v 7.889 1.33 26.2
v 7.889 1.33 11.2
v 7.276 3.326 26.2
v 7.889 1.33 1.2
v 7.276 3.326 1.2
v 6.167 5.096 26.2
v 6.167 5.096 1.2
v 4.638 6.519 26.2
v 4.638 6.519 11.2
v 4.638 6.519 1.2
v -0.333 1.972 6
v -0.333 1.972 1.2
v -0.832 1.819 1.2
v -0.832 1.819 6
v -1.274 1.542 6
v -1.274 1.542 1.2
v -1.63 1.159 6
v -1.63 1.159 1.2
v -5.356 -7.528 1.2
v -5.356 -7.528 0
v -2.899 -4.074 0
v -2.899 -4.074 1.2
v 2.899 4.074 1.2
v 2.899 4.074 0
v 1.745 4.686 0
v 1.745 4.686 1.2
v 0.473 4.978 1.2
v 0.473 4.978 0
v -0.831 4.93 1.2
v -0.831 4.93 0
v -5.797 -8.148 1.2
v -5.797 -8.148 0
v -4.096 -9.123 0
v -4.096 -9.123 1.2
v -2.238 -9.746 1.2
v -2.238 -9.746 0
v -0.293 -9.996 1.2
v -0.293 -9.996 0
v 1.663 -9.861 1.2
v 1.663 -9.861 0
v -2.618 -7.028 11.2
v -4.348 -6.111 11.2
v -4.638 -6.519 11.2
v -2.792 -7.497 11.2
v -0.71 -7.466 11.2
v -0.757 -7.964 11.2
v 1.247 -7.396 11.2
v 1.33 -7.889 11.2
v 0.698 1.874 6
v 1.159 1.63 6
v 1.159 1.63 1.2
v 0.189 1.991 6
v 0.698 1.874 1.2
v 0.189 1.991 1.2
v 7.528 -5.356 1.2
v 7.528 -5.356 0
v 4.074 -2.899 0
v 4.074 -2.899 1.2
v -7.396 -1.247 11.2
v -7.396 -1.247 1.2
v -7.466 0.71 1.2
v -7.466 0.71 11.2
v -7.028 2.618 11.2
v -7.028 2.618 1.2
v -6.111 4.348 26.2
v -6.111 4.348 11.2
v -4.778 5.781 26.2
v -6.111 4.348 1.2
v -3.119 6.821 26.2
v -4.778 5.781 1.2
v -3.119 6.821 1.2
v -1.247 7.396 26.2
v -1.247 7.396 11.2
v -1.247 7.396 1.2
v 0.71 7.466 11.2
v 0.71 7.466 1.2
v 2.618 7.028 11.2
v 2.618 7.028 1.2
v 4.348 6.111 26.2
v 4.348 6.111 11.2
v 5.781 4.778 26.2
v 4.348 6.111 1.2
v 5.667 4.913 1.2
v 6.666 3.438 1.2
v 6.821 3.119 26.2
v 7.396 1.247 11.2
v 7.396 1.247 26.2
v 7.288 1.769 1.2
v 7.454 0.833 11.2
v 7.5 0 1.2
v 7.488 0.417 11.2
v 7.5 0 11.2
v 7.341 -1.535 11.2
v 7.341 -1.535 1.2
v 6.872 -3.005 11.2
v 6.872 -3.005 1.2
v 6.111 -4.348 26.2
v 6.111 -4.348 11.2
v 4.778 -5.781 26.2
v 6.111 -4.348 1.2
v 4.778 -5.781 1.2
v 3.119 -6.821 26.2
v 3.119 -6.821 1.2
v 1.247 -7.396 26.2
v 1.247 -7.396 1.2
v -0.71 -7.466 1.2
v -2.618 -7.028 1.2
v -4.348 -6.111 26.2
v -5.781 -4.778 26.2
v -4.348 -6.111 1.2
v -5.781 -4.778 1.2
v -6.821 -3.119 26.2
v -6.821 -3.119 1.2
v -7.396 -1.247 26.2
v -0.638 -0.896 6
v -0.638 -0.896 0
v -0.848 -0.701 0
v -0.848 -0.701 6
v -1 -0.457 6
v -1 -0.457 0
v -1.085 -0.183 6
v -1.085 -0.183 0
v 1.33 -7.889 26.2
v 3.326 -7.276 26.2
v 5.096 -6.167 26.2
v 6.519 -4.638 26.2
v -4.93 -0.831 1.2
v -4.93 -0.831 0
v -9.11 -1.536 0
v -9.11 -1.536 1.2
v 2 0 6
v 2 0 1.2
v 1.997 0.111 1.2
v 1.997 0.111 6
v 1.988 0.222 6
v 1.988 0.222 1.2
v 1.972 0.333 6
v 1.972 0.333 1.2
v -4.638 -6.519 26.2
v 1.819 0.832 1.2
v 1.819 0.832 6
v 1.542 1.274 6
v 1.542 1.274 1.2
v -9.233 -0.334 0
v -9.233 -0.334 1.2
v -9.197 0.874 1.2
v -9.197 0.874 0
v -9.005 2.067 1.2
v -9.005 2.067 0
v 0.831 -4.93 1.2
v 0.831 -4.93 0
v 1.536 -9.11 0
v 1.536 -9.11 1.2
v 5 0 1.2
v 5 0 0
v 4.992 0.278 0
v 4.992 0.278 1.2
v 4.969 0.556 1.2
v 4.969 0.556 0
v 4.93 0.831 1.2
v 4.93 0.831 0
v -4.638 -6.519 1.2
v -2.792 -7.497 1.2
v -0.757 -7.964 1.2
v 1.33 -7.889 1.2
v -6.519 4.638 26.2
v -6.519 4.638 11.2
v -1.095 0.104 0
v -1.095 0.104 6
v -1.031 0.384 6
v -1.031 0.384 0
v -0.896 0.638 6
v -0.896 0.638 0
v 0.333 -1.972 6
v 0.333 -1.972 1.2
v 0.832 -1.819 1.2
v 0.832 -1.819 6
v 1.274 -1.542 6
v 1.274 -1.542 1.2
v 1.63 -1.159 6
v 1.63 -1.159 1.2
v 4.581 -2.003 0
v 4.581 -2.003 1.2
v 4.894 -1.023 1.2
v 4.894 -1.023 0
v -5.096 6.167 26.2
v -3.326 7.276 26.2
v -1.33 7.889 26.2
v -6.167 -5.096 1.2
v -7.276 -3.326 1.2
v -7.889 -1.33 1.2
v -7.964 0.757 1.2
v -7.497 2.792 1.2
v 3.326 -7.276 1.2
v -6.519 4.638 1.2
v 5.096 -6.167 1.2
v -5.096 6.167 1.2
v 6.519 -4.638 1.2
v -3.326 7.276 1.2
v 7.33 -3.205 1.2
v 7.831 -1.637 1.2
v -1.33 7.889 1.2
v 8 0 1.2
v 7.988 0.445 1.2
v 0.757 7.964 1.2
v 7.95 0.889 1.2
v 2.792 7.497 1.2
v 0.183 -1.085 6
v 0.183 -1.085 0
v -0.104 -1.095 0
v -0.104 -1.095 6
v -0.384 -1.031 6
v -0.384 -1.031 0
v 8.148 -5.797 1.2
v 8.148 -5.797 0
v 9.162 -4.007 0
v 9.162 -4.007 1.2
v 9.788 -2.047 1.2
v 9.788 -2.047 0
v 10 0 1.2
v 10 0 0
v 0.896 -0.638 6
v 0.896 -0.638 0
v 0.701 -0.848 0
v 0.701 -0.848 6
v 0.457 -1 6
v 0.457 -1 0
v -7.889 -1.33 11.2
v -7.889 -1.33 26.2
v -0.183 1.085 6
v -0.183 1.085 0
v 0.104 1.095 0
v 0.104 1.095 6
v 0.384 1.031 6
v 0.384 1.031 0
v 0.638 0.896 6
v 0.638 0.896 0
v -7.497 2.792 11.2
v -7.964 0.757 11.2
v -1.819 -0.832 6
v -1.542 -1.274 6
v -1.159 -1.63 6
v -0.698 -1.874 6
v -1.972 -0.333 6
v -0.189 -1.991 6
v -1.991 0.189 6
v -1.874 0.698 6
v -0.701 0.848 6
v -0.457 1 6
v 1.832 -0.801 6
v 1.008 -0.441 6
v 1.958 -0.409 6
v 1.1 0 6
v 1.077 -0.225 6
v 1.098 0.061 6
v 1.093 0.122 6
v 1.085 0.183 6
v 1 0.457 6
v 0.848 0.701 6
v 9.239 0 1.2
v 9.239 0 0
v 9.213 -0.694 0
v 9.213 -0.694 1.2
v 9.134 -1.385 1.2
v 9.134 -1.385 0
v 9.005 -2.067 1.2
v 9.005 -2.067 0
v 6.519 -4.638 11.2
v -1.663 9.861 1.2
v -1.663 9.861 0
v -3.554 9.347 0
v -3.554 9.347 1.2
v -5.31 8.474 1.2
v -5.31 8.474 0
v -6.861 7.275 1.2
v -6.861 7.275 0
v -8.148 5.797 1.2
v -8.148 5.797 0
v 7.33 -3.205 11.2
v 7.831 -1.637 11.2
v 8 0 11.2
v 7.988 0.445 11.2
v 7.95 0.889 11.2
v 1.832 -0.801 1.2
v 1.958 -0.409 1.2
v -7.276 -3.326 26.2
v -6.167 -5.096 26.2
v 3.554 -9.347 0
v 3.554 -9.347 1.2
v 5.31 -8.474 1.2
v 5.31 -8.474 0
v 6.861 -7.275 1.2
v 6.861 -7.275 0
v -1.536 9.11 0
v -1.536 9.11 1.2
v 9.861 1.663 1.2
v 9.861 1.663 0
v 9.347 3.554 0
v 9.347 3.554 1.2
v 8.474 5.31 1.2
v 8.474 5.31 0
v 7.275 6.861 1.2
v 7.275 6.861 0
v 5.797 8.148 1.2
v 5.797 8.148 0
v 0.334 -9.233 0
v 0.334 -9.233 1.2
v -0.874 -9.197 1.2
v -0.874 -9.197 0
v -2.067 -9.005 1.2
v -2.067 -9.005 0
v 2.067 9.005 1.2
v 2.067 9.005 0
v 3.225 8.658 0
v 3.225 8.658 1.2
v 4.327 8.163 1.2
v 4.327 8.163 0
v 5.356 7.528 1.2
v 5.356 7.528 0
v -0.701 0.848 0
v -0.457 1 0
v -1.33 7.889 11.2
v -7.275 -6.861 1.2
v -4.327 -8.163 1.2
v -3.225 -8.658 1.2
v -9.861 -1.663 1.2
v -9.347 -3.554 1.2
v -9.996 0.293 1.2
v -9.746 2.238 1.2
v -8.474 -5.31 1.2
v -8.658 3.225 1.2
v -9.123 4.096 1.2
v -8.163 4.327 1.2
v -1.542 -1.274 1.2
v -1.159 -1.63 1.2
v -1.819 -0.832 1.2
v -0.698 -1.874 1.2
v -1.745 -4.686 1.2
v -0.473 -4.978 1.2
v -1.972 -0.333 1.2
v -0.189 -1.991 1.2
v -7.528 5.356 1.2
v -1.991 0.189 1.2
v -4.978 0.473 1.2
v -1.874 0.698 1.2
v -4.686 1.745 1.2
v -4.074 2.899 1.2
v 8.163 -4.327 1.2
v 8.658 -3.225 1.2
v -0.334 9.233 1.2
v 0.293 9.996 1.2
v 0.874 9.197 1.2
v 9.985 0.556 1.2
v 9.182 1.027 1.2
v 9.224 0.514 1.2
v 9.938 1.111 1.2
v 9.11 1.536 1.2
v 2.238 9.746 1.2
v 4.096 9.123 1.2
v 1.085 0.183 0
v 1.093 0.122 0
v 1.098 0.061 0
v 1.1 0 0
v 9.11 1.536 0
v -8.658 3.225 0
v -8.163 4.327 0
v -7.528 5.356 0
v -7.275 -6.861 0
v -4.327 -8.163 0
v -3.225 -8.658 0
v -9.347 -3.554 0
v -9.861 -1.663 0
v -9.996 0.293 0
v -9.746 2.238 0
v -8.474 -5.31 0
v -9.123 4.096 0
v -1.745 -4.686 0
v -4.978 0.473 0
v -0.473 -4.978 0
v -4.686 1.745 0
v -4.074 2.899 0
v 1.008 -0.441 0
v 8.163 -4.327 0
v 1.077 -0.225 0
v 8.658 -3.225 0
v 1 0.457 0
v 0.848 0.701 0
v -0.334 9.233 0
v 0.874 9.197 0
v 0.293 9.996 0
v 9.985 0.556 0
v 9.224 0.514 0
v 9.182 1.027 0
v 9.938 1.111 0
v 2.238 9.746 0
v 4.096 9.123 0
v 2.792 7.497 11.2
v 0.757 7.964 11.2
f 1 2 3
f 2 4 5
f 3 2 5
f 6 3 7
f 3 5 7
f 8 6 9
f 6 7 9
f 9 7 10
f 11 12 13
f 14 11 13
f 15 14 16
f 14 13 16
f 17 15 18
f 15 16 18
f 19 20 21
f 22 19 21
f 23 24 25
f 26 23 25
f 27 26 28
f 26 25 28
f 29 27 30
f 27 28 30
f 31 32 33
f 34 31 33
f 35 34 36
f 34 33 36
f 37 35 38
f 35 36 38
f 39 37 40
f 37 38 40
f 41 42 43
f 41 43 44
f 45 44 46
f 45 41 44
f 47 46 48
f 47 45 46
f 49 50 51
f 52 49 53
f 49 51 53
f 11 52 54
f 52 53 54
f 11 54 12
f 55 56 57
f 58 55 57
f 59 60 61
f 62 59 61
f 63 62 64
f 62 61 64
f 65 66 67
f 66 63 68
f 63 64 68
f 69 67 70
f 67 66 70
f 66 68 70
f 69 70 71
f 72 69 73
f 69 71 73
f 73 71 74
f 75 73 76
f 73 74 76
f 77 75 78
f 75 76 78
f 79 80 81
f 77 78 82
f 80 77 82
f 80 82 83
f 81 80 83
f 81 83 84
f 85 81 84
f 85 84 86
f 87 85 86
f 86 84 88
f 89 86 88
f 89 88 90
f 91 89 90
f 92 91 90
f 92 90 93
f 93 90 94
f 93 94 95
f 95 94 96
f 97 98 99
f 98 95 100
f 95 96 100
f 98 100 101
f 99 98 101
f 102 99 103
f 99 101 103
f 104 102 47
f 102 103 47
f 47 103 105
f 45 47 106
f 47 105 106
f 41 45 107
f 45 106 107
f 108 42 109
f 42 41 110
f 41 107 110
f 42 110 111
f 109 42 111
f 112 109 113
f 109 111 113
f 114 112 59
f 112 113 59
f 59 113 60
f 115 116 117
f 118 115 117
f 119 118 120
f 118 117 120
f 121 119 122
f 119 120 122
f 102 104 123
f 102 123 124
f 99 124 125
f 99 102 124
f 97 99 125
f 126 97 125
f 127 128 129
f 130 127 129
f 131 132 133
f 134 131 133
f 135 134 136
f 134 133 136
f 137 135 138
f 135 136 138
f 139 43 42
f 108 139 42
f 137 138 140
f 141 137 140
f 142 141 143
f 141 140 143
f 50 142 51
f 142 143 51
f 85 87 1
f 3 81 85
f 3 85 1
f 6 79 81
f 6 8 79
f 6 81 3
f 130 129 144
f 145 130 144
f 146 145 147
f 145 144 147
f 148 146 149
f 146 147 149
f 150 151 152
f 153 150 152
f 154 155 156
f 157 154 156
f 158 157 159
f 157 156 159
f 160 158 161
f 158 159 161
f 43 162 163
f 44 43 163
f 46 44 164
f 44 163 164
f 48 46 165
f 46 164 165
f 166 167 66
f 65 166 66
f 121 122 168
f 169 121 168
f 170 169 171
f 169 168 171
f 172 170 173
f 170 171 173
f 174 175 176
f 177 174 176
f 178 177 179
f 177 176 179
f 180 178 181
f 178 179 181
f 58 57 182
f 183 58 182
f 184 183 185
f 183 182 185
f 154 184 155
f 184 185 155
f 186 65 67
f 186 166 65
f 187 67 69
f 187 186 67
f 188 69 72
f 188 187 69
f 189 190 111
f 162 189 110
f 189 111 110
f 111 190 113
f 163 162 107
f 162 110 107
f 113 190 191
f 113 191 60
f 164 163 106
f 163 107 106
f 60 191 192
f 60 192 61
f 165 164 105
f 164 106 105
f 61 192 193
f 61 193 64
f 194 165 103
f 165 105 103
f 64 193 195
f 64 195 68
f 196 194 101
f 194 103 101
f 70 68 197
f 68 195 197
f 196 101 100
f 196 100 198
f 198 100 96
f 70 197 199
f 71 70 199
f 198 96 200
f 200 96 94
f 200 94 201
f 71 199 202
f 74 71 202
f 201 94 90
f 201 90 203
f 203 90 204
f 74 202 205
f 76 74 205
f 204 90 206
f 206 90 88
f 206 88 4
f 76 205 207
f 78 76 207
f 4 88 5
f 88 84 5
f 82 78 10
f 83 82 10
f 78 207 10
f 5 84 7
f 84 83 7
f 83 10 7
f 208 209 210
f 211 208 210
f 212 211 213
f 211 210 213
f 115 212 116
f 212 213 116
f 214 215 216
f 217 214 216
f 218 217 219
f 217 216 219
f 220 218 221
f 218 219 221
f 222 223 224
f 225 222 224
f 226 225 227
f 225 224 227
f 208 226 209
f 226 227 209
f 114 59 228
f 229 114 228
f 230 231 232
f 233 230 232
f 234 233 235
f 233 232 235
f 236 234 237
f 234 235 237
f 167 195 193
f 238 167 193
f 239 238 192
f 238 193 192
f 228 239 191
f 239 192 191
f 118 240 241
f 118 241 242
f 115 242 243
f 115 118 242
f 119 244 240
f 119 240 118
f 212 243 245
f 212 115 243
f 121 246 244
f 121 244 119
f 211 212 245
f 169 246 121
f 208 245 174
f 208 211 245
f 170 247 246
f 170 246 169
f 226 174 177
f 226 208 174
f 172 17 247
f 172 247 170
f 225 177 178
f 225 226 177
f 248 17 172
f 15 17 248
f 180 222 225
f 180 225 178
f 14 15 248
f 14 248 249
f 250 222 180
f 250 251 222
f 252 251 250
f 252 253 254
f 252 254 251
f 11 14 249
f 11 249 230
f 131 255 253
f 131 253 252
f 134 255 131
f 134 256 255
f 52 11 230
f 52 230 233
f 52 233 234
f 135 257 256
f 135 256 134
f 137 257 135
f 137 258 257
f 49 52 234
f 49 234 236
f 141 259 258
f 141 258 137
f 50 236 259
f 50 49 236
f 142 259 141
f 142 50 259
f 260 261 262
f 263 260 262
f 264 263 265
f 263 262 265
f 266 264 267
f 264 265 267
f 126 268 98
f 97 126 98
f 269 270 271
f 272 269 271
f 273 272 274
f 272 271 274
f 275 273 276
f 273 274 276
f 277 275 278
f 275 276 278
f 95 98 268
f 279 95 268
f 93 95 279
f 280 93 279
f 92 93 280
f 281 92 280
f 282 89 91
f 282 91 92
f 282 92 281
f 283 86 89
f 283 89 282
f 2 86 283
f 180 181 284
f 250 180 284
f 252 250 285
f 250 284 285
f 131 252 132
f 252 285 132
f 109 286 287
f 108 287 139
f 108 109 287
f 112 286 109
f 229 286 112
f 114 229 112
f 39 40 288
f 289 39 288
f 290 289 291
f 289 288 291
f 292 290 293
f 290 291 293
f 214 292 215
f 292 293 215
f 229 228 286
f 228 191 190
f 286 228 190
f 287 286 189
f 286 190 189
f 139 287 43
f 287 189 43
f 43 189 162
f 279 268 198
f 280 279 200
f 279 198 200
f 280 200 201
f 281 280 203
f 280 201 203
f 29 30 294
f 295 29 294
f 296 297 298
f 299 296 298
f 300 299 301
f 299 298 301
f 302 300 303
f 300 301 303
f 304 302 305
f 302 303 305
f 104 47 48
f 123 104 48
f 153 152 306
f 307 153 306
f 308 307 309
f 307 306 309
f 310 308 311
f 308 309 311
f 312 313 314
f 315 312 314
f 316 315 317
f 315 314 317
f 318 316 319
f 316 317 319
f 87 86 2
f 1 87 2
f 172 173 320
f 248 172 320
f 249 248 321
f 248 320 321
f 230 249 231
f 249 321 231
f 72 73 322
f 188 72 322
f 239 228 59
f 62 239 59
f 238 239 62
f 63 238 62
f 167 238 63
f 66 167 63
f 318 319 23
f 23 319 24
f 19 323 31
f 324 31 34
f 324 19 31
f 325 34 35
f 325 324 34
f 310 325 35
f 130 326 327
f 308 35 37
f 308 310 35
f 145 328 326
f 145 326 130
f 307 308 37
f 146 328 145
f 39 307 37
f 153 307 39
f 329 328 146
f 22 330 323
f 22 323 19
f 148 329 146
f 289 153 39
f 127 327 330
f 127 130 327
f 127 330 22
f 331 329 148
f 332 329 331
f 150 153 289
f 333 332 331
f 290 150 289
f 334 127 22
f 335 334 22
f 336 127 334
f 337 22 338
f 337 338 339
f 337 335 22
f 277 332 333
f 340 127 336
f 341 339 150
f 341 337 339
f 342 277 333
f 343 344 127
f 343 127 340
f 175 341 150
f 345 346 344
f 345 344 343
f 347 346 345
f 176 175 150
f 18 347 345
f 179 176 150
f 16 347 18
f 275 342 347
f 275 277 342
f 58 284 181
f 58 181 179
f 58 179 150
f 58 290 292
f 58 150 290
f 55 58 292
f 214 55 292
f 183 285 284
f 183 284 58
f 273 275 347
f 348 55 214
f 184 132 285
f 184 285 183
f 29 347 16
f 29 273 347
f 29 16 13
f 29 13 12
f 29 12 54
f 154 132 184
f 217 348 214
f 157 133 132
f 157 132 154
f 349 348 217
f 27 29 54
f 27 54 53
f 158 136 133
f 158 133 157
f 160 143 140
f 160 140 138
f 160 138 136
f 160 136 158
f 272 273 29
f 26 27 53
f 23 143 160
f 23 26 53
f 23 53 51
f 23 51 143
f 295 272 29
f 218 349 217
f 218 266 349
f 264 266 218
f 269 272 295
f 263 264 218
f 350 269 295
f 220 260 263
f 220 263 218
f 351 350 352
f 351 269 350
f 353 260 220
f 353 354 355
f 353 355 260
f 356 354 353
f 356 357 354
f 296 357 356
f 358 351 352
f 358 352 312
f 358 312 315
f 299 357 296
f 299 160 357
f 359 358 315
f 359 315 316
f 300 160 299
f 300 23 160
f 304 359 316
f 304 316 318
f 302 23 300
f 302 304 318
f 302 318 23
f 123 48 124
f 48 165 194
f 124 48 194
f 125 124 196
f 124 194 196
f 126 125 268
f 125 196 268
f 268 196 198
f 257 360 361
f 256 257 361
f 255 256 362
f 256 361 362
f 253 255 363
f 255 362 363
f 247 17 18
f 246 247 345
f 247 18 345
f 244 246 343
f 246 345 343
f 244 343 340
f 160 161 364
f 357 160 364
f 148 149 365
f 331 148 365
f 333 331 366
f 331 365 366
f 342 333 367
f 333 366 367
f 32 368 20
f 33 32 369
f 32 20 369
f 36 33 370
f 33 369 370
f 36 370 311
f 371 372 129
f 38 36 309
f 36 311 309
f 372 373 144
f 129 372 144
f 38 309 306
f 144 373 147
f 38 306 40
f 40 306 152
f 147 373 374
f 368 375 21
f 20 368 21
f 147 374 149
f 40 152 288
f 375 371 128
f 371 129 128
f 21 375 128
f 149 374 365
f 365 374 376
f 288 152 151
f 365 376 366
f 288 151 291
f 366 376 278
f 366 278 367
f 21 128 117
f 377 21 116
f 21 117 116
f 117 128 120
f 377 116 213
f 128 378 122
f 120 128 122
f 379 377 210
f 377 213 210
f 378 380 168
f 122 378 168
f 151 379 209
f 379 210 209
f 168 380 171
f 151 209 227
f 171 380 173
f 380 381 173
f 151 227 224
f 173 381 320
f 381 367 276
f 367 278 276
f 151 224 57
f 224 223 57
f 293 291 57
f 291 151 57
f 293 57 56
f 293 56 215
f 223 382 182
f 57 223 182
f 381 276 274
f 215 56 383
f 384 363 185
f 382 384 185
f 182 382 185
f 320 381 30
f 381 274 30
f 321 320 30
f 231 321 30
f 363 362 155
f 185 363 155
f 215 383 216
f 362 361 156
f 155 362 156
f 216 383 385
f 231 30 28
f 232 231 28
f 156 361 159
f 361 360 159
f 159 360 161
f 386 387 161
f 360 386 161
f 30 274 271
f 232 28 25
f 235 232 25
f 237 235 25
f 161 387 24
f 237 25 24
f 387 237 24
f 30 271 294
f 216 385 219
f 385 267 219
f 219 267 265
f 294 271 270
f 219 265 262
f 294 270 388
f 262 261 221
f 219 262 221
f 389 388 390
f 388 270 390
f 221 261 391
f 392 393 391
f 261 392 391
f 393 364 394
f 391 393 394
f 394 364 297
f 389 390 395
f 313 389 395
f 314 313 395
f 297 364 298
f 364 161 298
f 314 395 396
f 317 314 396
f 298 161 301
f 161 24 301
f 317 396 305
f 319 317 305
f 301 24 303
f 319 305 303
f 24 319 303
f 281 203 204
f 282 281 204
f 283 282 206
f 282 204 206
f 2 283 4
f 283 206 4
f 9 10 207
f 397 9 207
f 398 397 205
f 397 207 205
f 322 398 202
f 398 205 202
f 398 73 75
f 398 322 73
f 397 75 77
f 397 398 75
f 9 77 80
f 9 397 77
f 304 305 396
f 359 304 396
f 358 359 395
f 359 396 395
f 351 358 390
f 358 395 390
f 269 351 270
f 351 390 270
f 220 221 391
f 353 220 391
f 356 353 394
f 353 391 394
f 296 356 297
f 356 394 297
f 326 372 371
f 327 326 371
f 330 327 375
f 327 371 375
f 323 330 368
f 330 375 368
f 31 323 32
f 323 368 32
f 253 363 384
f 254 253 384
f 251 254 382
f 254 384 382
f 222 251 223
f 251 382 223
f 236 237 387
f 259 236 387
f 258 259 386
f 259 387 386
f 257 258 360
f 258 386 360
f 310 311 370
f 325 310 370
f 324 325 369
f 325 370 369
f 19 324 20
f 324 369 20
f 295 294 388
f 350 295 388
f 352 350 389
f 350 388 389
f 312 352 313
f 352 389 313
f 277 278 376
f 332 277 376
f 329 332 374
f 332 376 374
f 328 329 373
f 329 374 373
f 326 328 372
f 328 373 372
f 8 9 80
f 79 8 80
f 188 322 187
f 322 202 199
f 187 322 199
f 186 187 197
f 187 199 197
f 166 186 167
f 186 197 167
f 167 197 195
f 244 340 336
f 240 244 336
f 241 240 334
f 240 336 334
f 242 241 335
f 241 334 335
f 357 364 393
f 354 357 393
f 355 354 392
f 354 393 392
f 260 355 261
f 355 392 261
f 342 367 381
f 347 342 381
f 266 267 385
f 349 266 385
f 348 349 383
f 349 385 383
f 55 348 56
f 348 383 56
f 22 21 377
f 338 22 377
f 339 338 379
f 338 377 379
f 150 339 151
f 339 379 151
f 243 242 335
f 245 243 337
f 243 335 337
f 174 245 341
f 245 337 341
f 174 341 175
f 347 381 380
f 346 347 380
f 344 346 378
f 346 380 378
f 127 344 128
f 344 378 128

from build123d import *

# Parameters (mm, degrees)
F1_DEPTH = 1.2
F2_DEPTH = 6
F4_DEPTH = 25
F5_DEPTH = 10


with BuildPart() as f1:
    # F0 (on Top) → F1 (new body)
    with BuildSketch(Plane.XY):
        with BuildLine():
            ThreePointArc((8.1482783535, -5.7970302633), (9.5258276159, -3.0427961207), (10, 0))
            ThreePointArc((10, 0), (9.965144828, 0.8341993506), (9.8608222887, 1.6625834689))
            Line((9.8608222887, 1.6625834689), (9.0045502887, -2.0672235383))
            Line((9.0045502887, -2.0672235383), (8.1482783535, -5.7970302633))
        make_face()
        with BuildLine():
            Line((7.8289263433, 4.9054308037), (9.8608222887, 1.6625834689))
            ThreePointArc((9.8608222887, 1.6625834689), (8.4739687378, 5.3096001573), (5.7970302633, 8.1482783535))
            Line((5.7970302633, 8.1482783535), (7.8289263433, 4.9054308037))
        make_face()
        with BuildLine():
            Line((9.1102118863, 1.536026838), (9.8608222887, 1.6625834689))
            Line((9.8608222887, 1.6625834689), (7.8289263433, 4.9054308037))
            ThreePointArc((7.8289263433, 4.9054308037), (8.6354977715, 3.2838266242), (9.1102118863, 1.536026838))
        make_face()
        with BuildLine():
            Line((9.0045502887, -2.0672235383), (9.8608222887, 1.6625834689))
            Line((9.8608222887, 1.6625834689), (9.1102118863, 1.536026838))
            ThreePointArc((9.1102118863, 1.536026838), (9.2065933451, 0.7706997061), (9.2387953251, 0))
            ThreePointArc((9.2387953251, 0), (9.1800472812, -1.040226405), (9.0045502887, -2.0672235383))
        make_face()
        with BuildLine():
            Line((7.528027596, -5.3557576096), (8.1482783535, -5.7970302633))
            Line((8.1482783535, -5.7970302633), (9.0045502887, -2.0672235383))
            ThreePointArc((9.0045502887, -2.0672235383), (8.4282351037, -3.7842029671), (7.528027596, -5.3557576096))
        make_face()
        with BuildLine():
            ThreePointArc((1.6625834689, -9.8608222887), (5.3096001573, -8.4739687378), (8.1482783535, -5.7970302633))
            Line((8.1482783535, -5.7970302633), (4.9054307168, -7.8289263978))
            Line((4.9054307168, -7.8289263978), (1.6625834689, -9.8608222887))
        make_face()
        with BuildLine():
            Line((4.9054307168, -7.8289263978), (8.1482783535, -5.7970302633))
            Line((8.1482783535, -5.7970302633), (7.528027596, -5.3557576096))
            ThreePointArc((7.528027596, -5.3557576096), (6.3385220965, -6.7214936355), (4.9054307168, -7.8289263978))
        make_face()
        with BuildLine():
            Line((2.0672236693, 9.0045502586), (5.7970302633, 8.1482783535))
            ThreePointArc((5.7970302633, 8.1482783535), (2.2375464814, 9.7464550347), (-1.6625834689, 9.8608222887))
            Line((-1.6625834689, 9.8608222887), (2.0672236693, 9.0045502586))
        make_face()
        with BuildLine():
            Line((5.3557576096, 7.528027596), (5.7970302633, 8.1482783535))
            Line((5.7970302633, 8.1482783535), (2.0672236693, 9.0045502586))
            ThreePointArc((2.0672236693, 9.0045502586), (3.7842030284, 8.4282350762), (5.3557576096, 7.528027596))
        make_face()
        with BuildLine():
            Line((7.8289263433, 4.9054308037), (5.7970302633, 8.1482783535))
            Line((5.7970302633, 8.1482783535), (5.3557576096, 7.528027596))
            ThreePointArc((5.3557576096, 7.528027596), (6.7214936003, 6.3385221338), (7.8289263433, 4.9054308037))
        make_face()
        with BuildLine():
            Line((1.536026838, -9.1102118863), (1.6625834689, -9.8608222887))
            Line((1.6625834689, -9.8608222887), (4.9054307168, -7.8289263978))
            ThreePointArc((4.9054307168, -7.8289263978), (3.2838265763, -8.6354977897), (1.536026838, -9.1102118863))
        make_face()
        with BuildLine():
            ThreePointArc((-5.7970302633, -8.1482783535), (-2.2375464814, -9.7464550347), (1.6625834689, -9.8608222887))
            Line((1.6625834689, -9.8608222887), (-2.0672231954, -9.0045503674))
            Line((-2.0672231954, -9.0045503674), (-5.7970302633, -8.1482783535))
        make_face()
        with BuildLine():
            Line((-2.0672231954, -9.0045503674), (1.6625834689, -9.8608222887))
            Line((1.6625834689, -9.8608222887), (1.536026838, -9.1102118863))
            ThreePointArc((1.536026838, -9.1102118863), (-0.2708015541, -9.2348256929), (-2.0672231954, -9.0045503674))
        make_face()
        with BuildLine():
            Line((-4.9054310148, 7.828926211), (-1.6625834689, 9.8608222887))
            ThreePointArc((-1.6625834689, 9.8608222887), (-5.3096001573, 8.4739687378), (-8.1482783535, 5.7970302633))
            Line((-8.1482783535, 5.7970302633), (-4.9054310148, 7.828926211))
        make_face()
        with BuildLine():
            Line((-1.536026838, 9.1102118863), (-1.6625834689, 9.8608222887))
            Line((-1.6625834689, 9.8608222887), (-4.9054310148, 7.828926211))
            ThreePointArc((-4.9054310148, 7.828926211), (-3.2838267407, 8.6354977272), (-1.536026838, 9.1102118863))
        make_face()
        with BuildLine():
            Line((2.0672236693, 9.0045502586), (-1.6625834689, 9.8608222887))
            Line((-1.6625834689, 9.8608222887), (-1.536026838, 9.1102118863))
            ThreePointArc((-1.536026838, 9.1102118863), (0.2708017971, 9.2348256857), (2.0672236693, 9.0045502586))
        make_face()
        with BuildLine():
            Line((-5.3557576096, -7.528027596), (-5.7970302633, -8.1482783535))
            Line((-5.7970302633, -8.1482783535), (-2.0672231954, -9.0045503674))
            ThreePointArc((-2.0672231954, -9.0045503674), (-3.7842028066, -8.4282351757), (-5.3557576096, -7.528027596))
        make_face()
        with BuildLine():
            ThreePointArc((-9.8608222887, -1.6625834689), (-8.4739687378, -5.3096001573), (-5.7970302633, -8.1482783535))
            Line((-5.7970302633, -8.1482783535), (-7.8289263978, -4.9054307168))
            Line((-7.8289263978, -4.9054307168), (-9.8608222887, -1.6625834689))
        make_face()
        with BuildLine():
            Line((-7.8289263978, -4.9054307168), (-5.7970302633, -8.1482783535))
            Line((-5.7970302633, -8.1482783535), (-5.3557576096, -7.528027596))
            ThreePointArc((-5.3557576096, -7.528027596), (-6.7214936355, -6.3385220965), (-7.8289263978, -4.9054307168))
        make_face()
        with BuildLine():
            Line((-9.004550337, 2.0672233281), (-8.1482783535, 5.7970302633))
            ThreePointArc((-8.1482783535, 5.7970302633), (-9.7464550347, 2.2375464814), (-9.8608222887, -1.6625834689))
            Line((-9.8608222887, -1.6625834689), (-9.004550337, 2.0672233281))
        make_face()
        with BuildLine():
            Line((-7.528027596, 5.3557576096), (-8.1482783535, 5.7970302633))
            Line((-8.1482783535, 5.7970302633), (-9.004550337, 2.0672233281))
            ThreePointArc((-9.004550337, 2.0672233281), (-8.4282351479, 3.7842028687), (-7.528027596, 5.3557576096))
        make_face()
        with BuildLine():
            Line((-4.9054310148, 7.828926211), (-8.1482783535, 5.7970302633))
            Line((-8.1482783535, 5.7970302633), (-7.528027596, 5.3557576096))
            ThreePointArc((-7.528027596, 5.3557576096), (-6.3385222244, 6.7214935148), (-4.9054310148, 7.828926211))
        make_face()
        with BuildLine():
            Line((-9.1102118863, -1.536026838), (-9.8608222887, -1.6625834689))
            Line((-9.8608222887, -1.6625834689), (-7.8289263978, -4.9054307168))
            ThreePointArc((-7.8289263978, -4.9054307168), (-8.6354977897, -3.2838265763), (-9.1102118863, -1.536026838))
        make_face()
        with BuildLine():
            Line((-9.004550337, 2.0672233281), (-9.8608222887, -1.6625834689))
            Line((-9.8608222887, -1.6625834689), (-9.1102118863, -1.536026838))
            ThreePointArc((-9.1102118863, -1.536026838), (-9.2348256909, 0.2708016221), (-9.004550337, 2.0672233281))
        make_face()
        with BuildLine():
            ThreePointArc((-4.9304111443, -0.8312917344), (-4.2369843689, -2.6548000787), (-2.8985151316, -4.0741391768))
            Line((-2.8985151316, -4.0741391768), (-1.1594060527, -1.6296556707))
            ThreePointArc((-1.1594060527, -1.6296556707), (-1.6947937476, -1.0619200315), (-1.9721644577, -0.3325166938))
            Line((-1.9721644577, -0.3325166938), (-4.9304111443, -0.8312917344))
        make_face()
        with BuildLine():
            Line((-1.6296556707, 1.1594060527), (-4.0741391768, 2.8985151316))
            ThreePointArc((-4.0741391768, 2.8985151316), (-4.8732275174, 1.1187732407), (-4.9304111443, -0.8312917344))
            Line((-4.9304111443, -0.8312917344), (-1.9721644577, -0.3325166938))
            ThreePointArc((-1.9721644577, -0.3325166938), (-1.9492910069, 0.4475092963), (-1.6296556707, 1.1594060527))
        make_face()
        with BuildLine():
            Line((-0.3325166938, 1.9721644577), (-0.8312917344, 4.9304111443))
            ThreePointArc((-0.8312917344, 4.9304111443), (-2.6548000787, 4.2369843689), (-4.0741391768, 2.8985151316))
            Line((-4.0741391768, 2.8985151316), (-1.6296556707, 1.1594060527))
            ThreePointArc((-1.6296556707, 1.1594060527), (-1.0619200315, 1.6947937476), (-0.3325166938, 1.9721644577))
        make_face()
        with BuildLine():
            Line((1.1594060527, 1.6296556707), (2.8985151316, 4.0741391768))
            ThreePointArc((2.8985151316, 4.0741391768), (1.1187732407, 4.8732275174), (-0.8312917344, 4.9304111443))
            Line((-0.8312917344, 4.9304111443), (-0.3325166938, 1.9721644577))
            ThreePointArc((-0.3325166938, 1.9721644577), (0.4475092963, 1.9492910069), (1.1594060527, 1.6296556707))
        make_face()
        with BuildLine():
            Line((1.9721644577, 0.3325166938), (4.9304111443, 0.8312917344))
            ThreePointArc((4.9304111443, 0.8312917344), (4.2369843689, 2.6548000787), (2.8985151316, 4.0741391768))
            Line((2.8985151316, 4.0741391768), (1.1594060527, 1.6296556707))
            ThreePointArc((1.1594060527, 1.6296556707), (1.6947937476, 1.0619200315), (1.9721644577, 0.3325166938))
        make_face()
        with BuildLine():
            ThreePointArc((5, 0), (4.982572414, 0.4170996753), (4.9304111443, 0.8312917344))
            Line((4.9304111443, 0.8312917344), (1.9721644577, 0.3325166938))
            ThreePointArc((1.9721644577, 0.3325166938), (1.9930289656, 0.1668398701), (2, 0))
            ThreePointArc((2, 0), (1.9051655232, -0.6085592241), (1.6296556707, -1.1594060527))
            Line((1.6296556707, -1.1594060527), (4.0741391768, -2.8985151316))
            ThreePointArc((4.0741391768, -2.8985151316), (4.7629138079, -1.5213980604), (5, 0))
        make_face()
        with BuildLine():
            ThreePointArc((0.8312917344, -4.9304111443), (2.6548000787, -4.2369843689), (4.0741391768, -2.8985151316))
            Line((4.0741391768, -2.8985151316), (1.6296556707, -1.1594060527))
            ThreePointArc((1.6296556707, -1.1594060527), (1.0619200315, -1.6947937476), (0.3325166938, -1.9721644577))
            Line((0.3325166938, -1.9721644577), (0.8312917344, -4.9304111443))
        make_face()
        with BuildLine():
            ThreePointArc((-2.8985151316, -4.0741391768), (-1.1187732407, -4.8732275174), (0.8312917344, -4.9304111443))
            Line((0.8312917344, -4.9304111443), (0.3325166938, -1.9721644577))
            ThreePointArc((0.3325166938, -1.9721644577), (-0.4475092963, -1.9492910069), (-1.1594060527, -1.6296556707))
            Line((-1.1594060527, -1.6296556707), (-2.8985151316, -4.0741391768))
        make_face()
        with BuildLine():
            ThreePointArc((1.536026838, -9.1102118863), (3.2838265763, -8.6354977897), (4.9054307168, -7.8289263978))
            ThreePointArc((4.9054307168, -7.8289263978), (6.3385220965, -6.7214936355), (7.528027596, -5.3557576096))
            Line((7.528027596, -5.3557576096), (4.0741391768, -2.8985151316))
            ThreePointArc((4.0741391768, -2.8985151316), (2.6548000787, -4.2369843689), (0.8312917344, -4.9304111443))
            Line((0.8312917344, -4.9304111443), (1.536026838, -9.1102118863))
        make_face()
        with BuildLine():
            ThreePointArc((9.1102118863, 1.536026838), (8.6354977715, 3.2838266242), (7.8289263433, 4.9054308037))
            ThreePointArc((7.8289263433, 4.9054308037), (6.7214936003, 6.3385221338), (5.3557576096, 7.528027596))
            Line((5.3557576096, 7.528027596), (2.8985151316, 4.0741391768))
            ThreePointArc((2.8985151316, 4.0741391768), (4.2369843689, 2.6548000787), (4.9304111443, 0.8312917344))
            Line((4.9304111443, 0.8312917344), (9.1102118863, 1.536026838))
        make_face()
        with BuildLine():
            ThreePointArc((-1.536026838, 9.1102118863), (-3.2838267407, 8.6354977272), (-4.9054310148, 7.828926211))
            ThreePointArc((-4.9054310148, 7.828926211), (-6.3385222244, 6.7214935148), (-7.528027596, 5.3557576096))
            Line((-7.528027596, 5.3557576096), (-4.0741391768, 2.8985151316))
            ThreePointArc((-4.0741391768, 2.8985151316), (-2.6548000787, 4.2369843689), (-0.8312917344, 4.9304111443))
            Line((-0.8312917344, 4.9304111443), (-1.536026838, 9.1102118863))
        make_face()
        with BuildLine():
            ThreePointArc((-9.1102118863, -1.536026838), (-8.6354977897, -3.2838265763), (-7.8289263978, -4.9054307168))
            ThreePointArc((-7.8289263978, -4.9054307168), (-6.7214936355, -6.3385220965), (-5.3557576096, -7.528027596))
            Line((-5.3557576096, -7.528027596), (-2.8985151316, -4.0741391768))
            ThreePointArc((-2.8985151316, -4.0741391768), (-4.2369843689, -2.6548000787), (-4.9304111443, -0.8312917344))
            Line((-4.9304111443, -0.8312917344), (-9.1102118863, -1.536026838))
        make_face()
    extrude(amount=F1_DEPTH)

    # F0 (on Top) → F2 (join)
    with BuildSketch(Plane.XY):
        with BuildLine():
            Line((-0.1828841816, 1.0846904518), (-0.3325166938, 1.9721644577))
            ThreePointArc((-0.3325166938, 1.9721644577), (-1.0619200315, 1.6947937476), (-1.6296556707, 1.1594060527))
            Line((-1.6296556707, 1.1594060527), (-0.8963106189, 0.637673329))
            ThreePointArc((-0.8963106189, 0.637673329), (-0.5840560173, 0.9321365612), (-0.1828841816, 1.0846904518))
        make_face()
        with BuildLine():
            Line((-0.8963106189, 0.637673329), (-1.6296556707, 1.1594060527))
            ThreePointArc((-1.6296556707, 1.1594060527), (-1.9492910069, 0.4475092963), (-1.9721644577, -0.3325166938))
            Line((-1.9721644577, -0.3325166938), (-1.0846904518, -0.1828841816))
            ThreePointArc((-1.0846904518, -0.1828841816), (-1.0721100538, 0.246130113), (-0.8963106189, 0.637673329))
        make_face()
        with BuildLine():
            ThreePointArc((-1.9721644577, -0.3325166938), (-1.6947937476, -1.0619200315), (-1.1594060527, -1.6296556707))
            Line((-1.1594060527, -1.6296556707), (-0.637673329, -0.8963106189))
            ThreePointArc((-0.637673329, -0.8963106189), (-0.9321365612, -0.5840560173), (-1.0846904518, -0.1828841816))
            Line((-1.0846904518, -0.1828841816), (-1.9721644577, -0.3325166938))
        make_face()
        with BuildLine():
            ThreePointArc((-1.1594060527, -1.6296556707), (-0.4475092963, -1.9492910069), (0.3325166938, -1.9721644577))
            Line((0.3325166938, -1.9721644577), (0.1828841816, -1.0846904518))
            ThreePointArc((0.1828841816, -1.0846904518), (-0.246130113, -1.0721100538), (-0.637673329, -0.8963106189))
            Line((-0.637673329, -0.8963106189), (-1.1594060527, -1.6296556707))
        make_face()
        with BuildLine():
            ThreePointArc((0.3325166938, -1.9721644577), (1.0619200315, -1.6947937476), (1.6296556707, -1.1594060527))
            Line((1.6296556707, -1.1594060527), (0.8963106189, -0.637673329))
            ThreePointArc((0.8963106189, -0.637673329), (0.5840560173, -0.9321365612), (0.1828841816, -1.0846904518))
            Line((0.1828841816, -1.0846904518), (0.3325166938, -1.9721644577))
        make_face()
        with BuildLine():
            ThreePointArc((2, 0), (1.9930289656, 0.1668398701), (1.9721644577, 0.3325166938))
            Line((1.9721644577, 0.3325166938), (1.0846904518, 0.1828841816))
            ThreePointArc((1.0846904518, 0.1828841816), (1.0961659311, 0.0917619286), (1.1, 0))
            ThreePointArc((1.1, 0), (1.0478410377, -0.3347075733), (0.8963106189, -0.637673329))
            Line((0.8963106189, -0.637673329), (1.6296556707, -1.1594060527))
            ThreePointArc((1.6296556707, -1.1594060527), (1.9051655232, -0.6085592241), (2, 0))
        make_face()
        with BuildLine():
            Line((1.0846904518, 0.1828841816), (1.9721644577, 0.3325166938))
            ThreePointArc((1.9721644577, 0.3325166938), (1.6947937476, 1.0619200315), (1.1594060527, 1.6296556707))
            Line((1.1594060527, 1.6296556707), (0.637673329, 0.8963106189))
            ThreePointArc((0.637673329, 0.8963106189), (0.9321365612, 0.5840560173), (1.0846904518, 0.1828841816))
        make_face()
        with BuildLine():
            Line((0.637673329, 0.8963106189), (1.1594060527, 1.6296556707))
            ThreePointArc((1.1594060527, 1.6296556707), (0.4475092963, 1.9492910069), (-0.3325166938, 1.9721644577))
            Line((-0.3325166938, 1.9721644577), (-0.1828841816, 1.0846904518))
            ThreePointArc((-0.1828841816, 1.0846904518), (0.246130113, 1.0721100538), (0.637673329, 0.8963106189))
        make_face()
    extrude(amount=F2_DEPTH)


with BuildPart() as f4:
    # F3 (on face) → F4 (new body)
    with BuildSketch(Plane.XY.offset(1.2)):
        with BuildLine():
            Line((6.5186226828, -4.6376242106), (6.1112087651, -4.3477726975))
            ThreePointArc((6.1112087651, -4.3477726975), (3.982200118, -6.3554765533), (1.2469376016, -7.3956167165))
            Line((1.2469376016, -7.3956167165), (1.3300667751, -7.888657831))
            ThreePointArc((1.3300667751, -7.888657831), (4.2476801259, -6.7791749902), (6.5186226828, -4.6376242106))
        make_face()
    extrude(amount=F4_DEPTH)



with BuildPart() as f4b:
    # F3 (on face) → F4, piece 2 (new body)
    with BuildSketch(Plane.XY.offset(1.2)):
        with BuildLine():
            ThreePointArc((-6.1112087651, 4.3477726975), (-3.982200118, 6.3554765533), (-1.2469376016, 7.3956167165))
            Line((-1.2469376016, 7.3956167165), (-1.3300667751, 7.888657831))
            ThreePointArc((-1.3300667751, 7.888657831), (-4.2476801259, 6.7791749902), (-6.5186226828, 4.6376242106))
            Line((-6.5186226828, 4.6376242106), (-6.1112087651, 4.3477726975))
        make_face()
    extrude(amount=F4_DEPTH)


with BuildPart() as f4c:
    # F3 (on face) → F4, piece 3 (new body)
    with BuildSketch(Plane.XY.offset(1.2)):
        with BuildLine():
            ThreePointArc((4.3477726975, 6.1112087651), (6.3554765533, 3.982200118), (7.3956167165, 1.2469376016))
            Line((7.3956167165, 1.2469376016), (7.888657831, 1.3300667751))
            ThreePointArc((7.888657831, 1.3300667751), (6.7791749902, 4.2476801259), (4.6376242106, 6.5186226828))
            Line((4.6376242106, 6.5186226828), (4.3477726975, 6.1112087651))
        make_face()
    extrude(amount=F4_DEPTH)


with BuildPart() as f4d:
    # F3 (on face) → F4, piece 4 (new body)
    with BuildSketch(Plane.XY.offset(1.2)):
        with BuildLine():
            Line((-4.6376242106, -6.5186226828), (-4.3477726975, -6.1112087651))
            ThreePointArc((-4.3477726975, -6.1112087651), (-6.3554765533, -3.982200118), (-7.3956167165, -1.2469376016))
            Line((-7.3956167165, -1.2469376016), (-7.888657831, -1.3300667751))
            ThreePointArc((-7.888657831, -1.3300667751), (-6.7791749902, -4.2476801259), (-4.6376242106, -6.5186226828))
        make_face()
    extrude(amount=F4_DEPTH)


with BuildPart() as f4_1:
    add(f4.part)

    add(f4b.part)  # F5 merges F4b

    add(f4c.part)  # F5 merges F4c

    add(f4d.part)  # F5 merges F4d
    # F3 (on face) → F5 (join)
    with BuildSketch(Plane.XY.offset(1.2)):
        with BuildLine():
            Line((1.3300667751, -7.888657831), (1.2469376016, -7.3956167165))
            ThreePointArc((1.2469376016, -7.3956167165), (-1.6781598611, -7.309841276), (-4.3477726975, -6.1112087651))
            Line((-4.3477726975, -6.1112087651), (-4.6376242106, -6.5186226828))
            ThreePointArc((-4.6376242106, -6.5186226828), (-1.7900371851, -7.7971640278), (1.3300667751, -7.888657831))
        make_face()
        with BuildLine():
            ThreePointArc((7.3956167165, 1.2469376016), (7.473858621, 0.625649513), (7.5, 0))
            ThreePointArc((7.5, 0), (7.1443707119, -2.2820970906), (6.1112087651, -4.3477726975))
            Line((6.1112087651, -4.3477726975), (6.5186226828, -4.6376242106))
            ThreePointArc((6.5186226828, -4.6376242106), (7.6206620927, -2.4342368966), (8, 0))
            ThreePointArc((8, 0), (7.9721158624, 0.6673594805), (7.888657831, 1.3300667751))
            Line((7.888657831, 1.3300667751), (7.3956167165, 1.2469376016))
        make_face()
        with BuildLine():
            ThreePointArc((-1.2469376016, 7.3956167165), (1.6781598611, 7.309841276), (4.3477726975, 6.1112087651))
            Line((4.3477726975, 6.1112087651), (4.6376242106, 6.5186226828))
            ThreePointArc((4.6376242106, 6.5186226828), (1.7900371851, 7.7971640278), (-1.3300667751, 7.888657831))
            Line((-1.3300667751, 7.888657831), (-1.2469376016, 7.3956167165))
        make_face()
        with BuildLine():
            ThreePointArc((-7.3956167165, -1.2469376016), (-7.309841276, 1.6781598611), (-6.1112087651, 4.3477726975))
            Line((-6.1112087651, 4.3477726975), (-6.5186226828, 4.6376242106))
            ThreePointArc((-6.5186226828, 4.6376242106), (-7.7971640278, 1.7900371851), (-7.888657831, -1.3300667751))
            Line((-7.888657831, -1.3300667751), (-7.3956167165, -1.2469376016))
        make_face()
    extrude(amount=F5_DEPTH)


solid = Compound([f1.part, f4_1.part])
